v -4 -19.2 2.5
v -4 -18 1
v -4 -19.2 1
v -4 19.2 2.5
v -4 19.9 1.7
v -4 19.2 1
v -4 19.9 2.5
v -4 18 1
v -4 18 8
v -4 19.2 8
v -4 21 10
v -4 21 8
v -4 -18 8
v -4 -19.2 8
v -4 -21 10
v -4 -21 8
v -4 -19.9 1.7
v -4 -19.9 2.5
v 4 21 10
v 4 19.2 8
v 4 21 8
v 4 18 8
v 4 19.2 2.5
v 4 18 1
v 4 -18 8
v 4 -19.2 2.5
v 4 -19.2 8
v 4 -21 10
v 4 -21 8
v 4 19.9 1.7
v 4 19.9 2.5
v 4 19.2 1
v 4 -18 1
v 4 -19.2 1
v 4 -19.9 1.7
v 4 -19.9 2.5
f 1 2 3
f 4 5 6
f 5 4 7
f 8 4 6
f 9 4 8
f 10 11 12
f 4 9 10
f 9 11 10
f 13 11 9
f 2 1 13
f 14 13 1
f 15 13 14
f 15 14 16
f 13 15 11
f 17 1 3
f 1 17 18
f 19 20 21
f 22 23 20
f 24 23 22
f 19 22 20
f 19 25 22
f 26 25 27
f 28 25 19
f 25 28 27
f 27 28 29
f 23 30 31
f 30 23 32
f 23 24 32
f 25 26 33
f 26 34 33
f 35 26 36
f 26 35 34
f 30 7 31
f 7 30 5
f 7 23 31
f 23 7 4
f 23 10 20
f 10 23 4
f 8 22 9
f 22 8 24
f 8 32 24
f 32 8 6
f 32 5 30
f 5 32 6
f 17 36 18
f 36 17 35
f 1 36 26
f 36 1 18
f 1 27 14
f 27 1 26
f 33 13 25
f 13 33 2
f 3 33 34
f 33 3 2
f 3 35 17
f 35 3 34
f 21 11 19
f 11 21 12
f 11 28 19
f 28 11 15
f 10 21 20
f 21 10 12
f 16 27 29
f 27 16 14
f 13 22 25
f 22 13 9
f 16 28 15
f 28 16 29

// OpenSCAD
// file: ../../screw-post/screw-post.scad
//-----------------------------------------------------------------------
// Screw post: a round post off the floor that a board screws down onto
//
// Two ways to fix:
//   "nut"  clearance hole through the post and floor; the nut sits in a hex
//          trap in the floor's underside, so the screw goes in from the top
//   "tap"  a pilot hole the screw cuts its own thread in (one or two fittings
//          in PLA/PETG); blind, the floor stays whole underneath
// and "head" for a screw up from below (head in a counterbore, nut on top).
//
// Modules, all in the same frame:
//   screwPostGhost()     the screw (and nut), for previews
//   screwPost()          the post: add to the floor
//   screwPostFloorCut()  subtract from the floor: nut trap / counterbore and hole
//
// Frame: origin on the floor top, on the post's axis. Z up; the floor is
// Z = -floorThick .. 0. Units: mm.
//
// Sizes: "M2", "M2.5", "M3". screwPostScrew(size, ...) says which screw length
// reaches, so a project can assert it has that screw in the kit.
//-----------------------------------------------------------------------

//-- [name, screw Ø, nut across flats, nut thick, head Ø, head height, tap hole, post Ø]
//-- Nuts ISO 4032; heads ISO 7380 button. Tap holes: the usual ~0.8 x Ø for plastic
screwSizes = [
  ["M2",   2.0, 4.0, 1.6, 3.5, 1.1, 1.6, 5.0],
  ["M2.5", 2.5, 5.0, 2.0, 4.4, 1.4, 2.1, 6.0],    // head 4.4: measured on the kit's M2.5 (controller base)
  ["M3",   3.0, 5.5, 2.4, 5.7, 1.65, 2.5, 7.0],
];

screwHoleClear = 0.4;     // added to the screw Ø for a clearance hole
screwNutClear  = 0.3;     // CAL: across flats, nut trap over the nut. Set by the fit piece
screwTapClear  = 0.0;     // CAL: added to the tap hole. Set by the fit piece
screwHeadClear = 0.6;     // counterbore over the head Ø

function screwSize(size) = let (i = search([size], screwSizes)[0])
  assert(i != [] && i != undef, str("unknown screw size ", size)) screwSizes[i];
function screwDia(size)    = screwSize(size)[1];
function screwNutAF(size)  = screwSize(size)[2];
function screwNutH(size)   = screwSize(size)[3];
function screwHeadDia(size)= screwSize(size)[4];
function screwHeadH(size)  = screwSize(size)[5];
function screwPostDia(size)= screwSize(size)[7];

//-- Shortest screw that fills the nut, from the top of the clamped part (h + clamp
//-- above the floor) down to the nut trap's underside. Round up to a length you have.
function screwPostScrew(size, h, floorThick, clamp = 1.6) = h + clamp + floorThick;

module screwPostGhost(size, h, floorThick, clamp = 1.6, length, how = "nut")
{
  d = screwDia(size);
  L = is_undef(length) ? screwPostScrew(size, h, floorThick, clamp) : length;
  top = h + clamp;
  if (how == "head")
  {
    %color("Silver") translate([0, 0, -floorThick]) cylinder(d = screwHeadDia(size), h = screwHeadH(size), $fn = 24);
    %color("Silver") translate([0, 0, -floorThick + screwHeadH(size)]) cylinder(d = d, h = L, $fn = 16);
  }
  else
  {
    %color("Silver") translate([0, 0, top]) cylinder(d = screwHeadDia(size), h = screwHeadH(size), $fn = 24);
    %color("Silver") translate([0, 0, top - L]) cylinder(d = d, h = L, $fn = 16);
    if (how == "nut")
      %color("DimGray") translate([0, 0, -floorThick]) rotate([0, 0, 30]) cylinder(d = screwNutAF(size)/cos(30), h = screwNutH(size), $fn = 6);
  }
}

//-- how: "nut" | "head" (through hole) or "tap" (blind pilot hole). postDia defaults by size
module screwPost(size, h, how = "nut", postDia, tapClear = screwTapClear)
{
  pd = is_undef(postDia) ? screwPostDia(size) : postDia;
  hole = how == "tap" ? screwSize(size)[6] + tapClear : screwDia(size) + screwHoleClear;
  difference()
  {
    translate([0, 0, -0.01]) cylinder(d = pd, h = h + 0.01, $fn = 40);
    translate([0, 0, how == "tap" ? 0.6 : -1]) cylinder(d = hole, h = h + 2, $fn = 24);
    //-- lead-in so the screw starts square
    translate([0, 0, h - 0.4]) cylinder(d1 = hole, d2 = hole + 0.8, h = 0.41, $fn = 24);
  }
}

//-- "nut": hex trap from the underside, opening a little over the nut so it sits flush.
//-- "head": counterbore for the head. "tap": nothing.
module screwPostFloorCut(size, floorThick, how = "nut", nutClear = screwNutClear)
{
  d = screwDia(size) + screwHoleClear;
  if (how == "nut")
  {
    af = screwNutAF(size) + nutClear;
    translate([0, 0, -floorThick - 1]) rotate([0, 0, 30]) cylinder(d = af/cos(30), h = screwNutH(size) + 0.1 + 1, $fn = 6);
    translate([0, 0, -floorThick - 1]) cylinder(d = d + 0.4, h = floorThick + 2, $fn = 24);
  }
  if (how == "head")
  {
    translate([0, 0, -floorThick - 1]) cylinder(d = screwHeadDia(size) + screwHeadClear, h = screwHeadH(size) + 0.2 + 1, $fn = 32);
    translate([0, 0, -floorThick - 1]) cylinder(d = d + 0.4, h = floorThick + 2, $fn = 24);
  }
  assert(how == "tap" || floorThick >= (how == "nut" ? screwNutH(size) : screwHeadH(size)) + 0.1 + 0.3,
         str("floor too thin for the ", size, " ", how));
}
// main file
// The bridge's bar where it sits snapped into the carrier's posts, for the catalogue: the
// moving part of the "On a carrier" view, and the body for the collision check. It is a
// separate print: lipoBridgeBar() draws it flat for export.
use <../lipo-cradle.scad>

name = "602530";

lipoBridgeBarSeated(name);
